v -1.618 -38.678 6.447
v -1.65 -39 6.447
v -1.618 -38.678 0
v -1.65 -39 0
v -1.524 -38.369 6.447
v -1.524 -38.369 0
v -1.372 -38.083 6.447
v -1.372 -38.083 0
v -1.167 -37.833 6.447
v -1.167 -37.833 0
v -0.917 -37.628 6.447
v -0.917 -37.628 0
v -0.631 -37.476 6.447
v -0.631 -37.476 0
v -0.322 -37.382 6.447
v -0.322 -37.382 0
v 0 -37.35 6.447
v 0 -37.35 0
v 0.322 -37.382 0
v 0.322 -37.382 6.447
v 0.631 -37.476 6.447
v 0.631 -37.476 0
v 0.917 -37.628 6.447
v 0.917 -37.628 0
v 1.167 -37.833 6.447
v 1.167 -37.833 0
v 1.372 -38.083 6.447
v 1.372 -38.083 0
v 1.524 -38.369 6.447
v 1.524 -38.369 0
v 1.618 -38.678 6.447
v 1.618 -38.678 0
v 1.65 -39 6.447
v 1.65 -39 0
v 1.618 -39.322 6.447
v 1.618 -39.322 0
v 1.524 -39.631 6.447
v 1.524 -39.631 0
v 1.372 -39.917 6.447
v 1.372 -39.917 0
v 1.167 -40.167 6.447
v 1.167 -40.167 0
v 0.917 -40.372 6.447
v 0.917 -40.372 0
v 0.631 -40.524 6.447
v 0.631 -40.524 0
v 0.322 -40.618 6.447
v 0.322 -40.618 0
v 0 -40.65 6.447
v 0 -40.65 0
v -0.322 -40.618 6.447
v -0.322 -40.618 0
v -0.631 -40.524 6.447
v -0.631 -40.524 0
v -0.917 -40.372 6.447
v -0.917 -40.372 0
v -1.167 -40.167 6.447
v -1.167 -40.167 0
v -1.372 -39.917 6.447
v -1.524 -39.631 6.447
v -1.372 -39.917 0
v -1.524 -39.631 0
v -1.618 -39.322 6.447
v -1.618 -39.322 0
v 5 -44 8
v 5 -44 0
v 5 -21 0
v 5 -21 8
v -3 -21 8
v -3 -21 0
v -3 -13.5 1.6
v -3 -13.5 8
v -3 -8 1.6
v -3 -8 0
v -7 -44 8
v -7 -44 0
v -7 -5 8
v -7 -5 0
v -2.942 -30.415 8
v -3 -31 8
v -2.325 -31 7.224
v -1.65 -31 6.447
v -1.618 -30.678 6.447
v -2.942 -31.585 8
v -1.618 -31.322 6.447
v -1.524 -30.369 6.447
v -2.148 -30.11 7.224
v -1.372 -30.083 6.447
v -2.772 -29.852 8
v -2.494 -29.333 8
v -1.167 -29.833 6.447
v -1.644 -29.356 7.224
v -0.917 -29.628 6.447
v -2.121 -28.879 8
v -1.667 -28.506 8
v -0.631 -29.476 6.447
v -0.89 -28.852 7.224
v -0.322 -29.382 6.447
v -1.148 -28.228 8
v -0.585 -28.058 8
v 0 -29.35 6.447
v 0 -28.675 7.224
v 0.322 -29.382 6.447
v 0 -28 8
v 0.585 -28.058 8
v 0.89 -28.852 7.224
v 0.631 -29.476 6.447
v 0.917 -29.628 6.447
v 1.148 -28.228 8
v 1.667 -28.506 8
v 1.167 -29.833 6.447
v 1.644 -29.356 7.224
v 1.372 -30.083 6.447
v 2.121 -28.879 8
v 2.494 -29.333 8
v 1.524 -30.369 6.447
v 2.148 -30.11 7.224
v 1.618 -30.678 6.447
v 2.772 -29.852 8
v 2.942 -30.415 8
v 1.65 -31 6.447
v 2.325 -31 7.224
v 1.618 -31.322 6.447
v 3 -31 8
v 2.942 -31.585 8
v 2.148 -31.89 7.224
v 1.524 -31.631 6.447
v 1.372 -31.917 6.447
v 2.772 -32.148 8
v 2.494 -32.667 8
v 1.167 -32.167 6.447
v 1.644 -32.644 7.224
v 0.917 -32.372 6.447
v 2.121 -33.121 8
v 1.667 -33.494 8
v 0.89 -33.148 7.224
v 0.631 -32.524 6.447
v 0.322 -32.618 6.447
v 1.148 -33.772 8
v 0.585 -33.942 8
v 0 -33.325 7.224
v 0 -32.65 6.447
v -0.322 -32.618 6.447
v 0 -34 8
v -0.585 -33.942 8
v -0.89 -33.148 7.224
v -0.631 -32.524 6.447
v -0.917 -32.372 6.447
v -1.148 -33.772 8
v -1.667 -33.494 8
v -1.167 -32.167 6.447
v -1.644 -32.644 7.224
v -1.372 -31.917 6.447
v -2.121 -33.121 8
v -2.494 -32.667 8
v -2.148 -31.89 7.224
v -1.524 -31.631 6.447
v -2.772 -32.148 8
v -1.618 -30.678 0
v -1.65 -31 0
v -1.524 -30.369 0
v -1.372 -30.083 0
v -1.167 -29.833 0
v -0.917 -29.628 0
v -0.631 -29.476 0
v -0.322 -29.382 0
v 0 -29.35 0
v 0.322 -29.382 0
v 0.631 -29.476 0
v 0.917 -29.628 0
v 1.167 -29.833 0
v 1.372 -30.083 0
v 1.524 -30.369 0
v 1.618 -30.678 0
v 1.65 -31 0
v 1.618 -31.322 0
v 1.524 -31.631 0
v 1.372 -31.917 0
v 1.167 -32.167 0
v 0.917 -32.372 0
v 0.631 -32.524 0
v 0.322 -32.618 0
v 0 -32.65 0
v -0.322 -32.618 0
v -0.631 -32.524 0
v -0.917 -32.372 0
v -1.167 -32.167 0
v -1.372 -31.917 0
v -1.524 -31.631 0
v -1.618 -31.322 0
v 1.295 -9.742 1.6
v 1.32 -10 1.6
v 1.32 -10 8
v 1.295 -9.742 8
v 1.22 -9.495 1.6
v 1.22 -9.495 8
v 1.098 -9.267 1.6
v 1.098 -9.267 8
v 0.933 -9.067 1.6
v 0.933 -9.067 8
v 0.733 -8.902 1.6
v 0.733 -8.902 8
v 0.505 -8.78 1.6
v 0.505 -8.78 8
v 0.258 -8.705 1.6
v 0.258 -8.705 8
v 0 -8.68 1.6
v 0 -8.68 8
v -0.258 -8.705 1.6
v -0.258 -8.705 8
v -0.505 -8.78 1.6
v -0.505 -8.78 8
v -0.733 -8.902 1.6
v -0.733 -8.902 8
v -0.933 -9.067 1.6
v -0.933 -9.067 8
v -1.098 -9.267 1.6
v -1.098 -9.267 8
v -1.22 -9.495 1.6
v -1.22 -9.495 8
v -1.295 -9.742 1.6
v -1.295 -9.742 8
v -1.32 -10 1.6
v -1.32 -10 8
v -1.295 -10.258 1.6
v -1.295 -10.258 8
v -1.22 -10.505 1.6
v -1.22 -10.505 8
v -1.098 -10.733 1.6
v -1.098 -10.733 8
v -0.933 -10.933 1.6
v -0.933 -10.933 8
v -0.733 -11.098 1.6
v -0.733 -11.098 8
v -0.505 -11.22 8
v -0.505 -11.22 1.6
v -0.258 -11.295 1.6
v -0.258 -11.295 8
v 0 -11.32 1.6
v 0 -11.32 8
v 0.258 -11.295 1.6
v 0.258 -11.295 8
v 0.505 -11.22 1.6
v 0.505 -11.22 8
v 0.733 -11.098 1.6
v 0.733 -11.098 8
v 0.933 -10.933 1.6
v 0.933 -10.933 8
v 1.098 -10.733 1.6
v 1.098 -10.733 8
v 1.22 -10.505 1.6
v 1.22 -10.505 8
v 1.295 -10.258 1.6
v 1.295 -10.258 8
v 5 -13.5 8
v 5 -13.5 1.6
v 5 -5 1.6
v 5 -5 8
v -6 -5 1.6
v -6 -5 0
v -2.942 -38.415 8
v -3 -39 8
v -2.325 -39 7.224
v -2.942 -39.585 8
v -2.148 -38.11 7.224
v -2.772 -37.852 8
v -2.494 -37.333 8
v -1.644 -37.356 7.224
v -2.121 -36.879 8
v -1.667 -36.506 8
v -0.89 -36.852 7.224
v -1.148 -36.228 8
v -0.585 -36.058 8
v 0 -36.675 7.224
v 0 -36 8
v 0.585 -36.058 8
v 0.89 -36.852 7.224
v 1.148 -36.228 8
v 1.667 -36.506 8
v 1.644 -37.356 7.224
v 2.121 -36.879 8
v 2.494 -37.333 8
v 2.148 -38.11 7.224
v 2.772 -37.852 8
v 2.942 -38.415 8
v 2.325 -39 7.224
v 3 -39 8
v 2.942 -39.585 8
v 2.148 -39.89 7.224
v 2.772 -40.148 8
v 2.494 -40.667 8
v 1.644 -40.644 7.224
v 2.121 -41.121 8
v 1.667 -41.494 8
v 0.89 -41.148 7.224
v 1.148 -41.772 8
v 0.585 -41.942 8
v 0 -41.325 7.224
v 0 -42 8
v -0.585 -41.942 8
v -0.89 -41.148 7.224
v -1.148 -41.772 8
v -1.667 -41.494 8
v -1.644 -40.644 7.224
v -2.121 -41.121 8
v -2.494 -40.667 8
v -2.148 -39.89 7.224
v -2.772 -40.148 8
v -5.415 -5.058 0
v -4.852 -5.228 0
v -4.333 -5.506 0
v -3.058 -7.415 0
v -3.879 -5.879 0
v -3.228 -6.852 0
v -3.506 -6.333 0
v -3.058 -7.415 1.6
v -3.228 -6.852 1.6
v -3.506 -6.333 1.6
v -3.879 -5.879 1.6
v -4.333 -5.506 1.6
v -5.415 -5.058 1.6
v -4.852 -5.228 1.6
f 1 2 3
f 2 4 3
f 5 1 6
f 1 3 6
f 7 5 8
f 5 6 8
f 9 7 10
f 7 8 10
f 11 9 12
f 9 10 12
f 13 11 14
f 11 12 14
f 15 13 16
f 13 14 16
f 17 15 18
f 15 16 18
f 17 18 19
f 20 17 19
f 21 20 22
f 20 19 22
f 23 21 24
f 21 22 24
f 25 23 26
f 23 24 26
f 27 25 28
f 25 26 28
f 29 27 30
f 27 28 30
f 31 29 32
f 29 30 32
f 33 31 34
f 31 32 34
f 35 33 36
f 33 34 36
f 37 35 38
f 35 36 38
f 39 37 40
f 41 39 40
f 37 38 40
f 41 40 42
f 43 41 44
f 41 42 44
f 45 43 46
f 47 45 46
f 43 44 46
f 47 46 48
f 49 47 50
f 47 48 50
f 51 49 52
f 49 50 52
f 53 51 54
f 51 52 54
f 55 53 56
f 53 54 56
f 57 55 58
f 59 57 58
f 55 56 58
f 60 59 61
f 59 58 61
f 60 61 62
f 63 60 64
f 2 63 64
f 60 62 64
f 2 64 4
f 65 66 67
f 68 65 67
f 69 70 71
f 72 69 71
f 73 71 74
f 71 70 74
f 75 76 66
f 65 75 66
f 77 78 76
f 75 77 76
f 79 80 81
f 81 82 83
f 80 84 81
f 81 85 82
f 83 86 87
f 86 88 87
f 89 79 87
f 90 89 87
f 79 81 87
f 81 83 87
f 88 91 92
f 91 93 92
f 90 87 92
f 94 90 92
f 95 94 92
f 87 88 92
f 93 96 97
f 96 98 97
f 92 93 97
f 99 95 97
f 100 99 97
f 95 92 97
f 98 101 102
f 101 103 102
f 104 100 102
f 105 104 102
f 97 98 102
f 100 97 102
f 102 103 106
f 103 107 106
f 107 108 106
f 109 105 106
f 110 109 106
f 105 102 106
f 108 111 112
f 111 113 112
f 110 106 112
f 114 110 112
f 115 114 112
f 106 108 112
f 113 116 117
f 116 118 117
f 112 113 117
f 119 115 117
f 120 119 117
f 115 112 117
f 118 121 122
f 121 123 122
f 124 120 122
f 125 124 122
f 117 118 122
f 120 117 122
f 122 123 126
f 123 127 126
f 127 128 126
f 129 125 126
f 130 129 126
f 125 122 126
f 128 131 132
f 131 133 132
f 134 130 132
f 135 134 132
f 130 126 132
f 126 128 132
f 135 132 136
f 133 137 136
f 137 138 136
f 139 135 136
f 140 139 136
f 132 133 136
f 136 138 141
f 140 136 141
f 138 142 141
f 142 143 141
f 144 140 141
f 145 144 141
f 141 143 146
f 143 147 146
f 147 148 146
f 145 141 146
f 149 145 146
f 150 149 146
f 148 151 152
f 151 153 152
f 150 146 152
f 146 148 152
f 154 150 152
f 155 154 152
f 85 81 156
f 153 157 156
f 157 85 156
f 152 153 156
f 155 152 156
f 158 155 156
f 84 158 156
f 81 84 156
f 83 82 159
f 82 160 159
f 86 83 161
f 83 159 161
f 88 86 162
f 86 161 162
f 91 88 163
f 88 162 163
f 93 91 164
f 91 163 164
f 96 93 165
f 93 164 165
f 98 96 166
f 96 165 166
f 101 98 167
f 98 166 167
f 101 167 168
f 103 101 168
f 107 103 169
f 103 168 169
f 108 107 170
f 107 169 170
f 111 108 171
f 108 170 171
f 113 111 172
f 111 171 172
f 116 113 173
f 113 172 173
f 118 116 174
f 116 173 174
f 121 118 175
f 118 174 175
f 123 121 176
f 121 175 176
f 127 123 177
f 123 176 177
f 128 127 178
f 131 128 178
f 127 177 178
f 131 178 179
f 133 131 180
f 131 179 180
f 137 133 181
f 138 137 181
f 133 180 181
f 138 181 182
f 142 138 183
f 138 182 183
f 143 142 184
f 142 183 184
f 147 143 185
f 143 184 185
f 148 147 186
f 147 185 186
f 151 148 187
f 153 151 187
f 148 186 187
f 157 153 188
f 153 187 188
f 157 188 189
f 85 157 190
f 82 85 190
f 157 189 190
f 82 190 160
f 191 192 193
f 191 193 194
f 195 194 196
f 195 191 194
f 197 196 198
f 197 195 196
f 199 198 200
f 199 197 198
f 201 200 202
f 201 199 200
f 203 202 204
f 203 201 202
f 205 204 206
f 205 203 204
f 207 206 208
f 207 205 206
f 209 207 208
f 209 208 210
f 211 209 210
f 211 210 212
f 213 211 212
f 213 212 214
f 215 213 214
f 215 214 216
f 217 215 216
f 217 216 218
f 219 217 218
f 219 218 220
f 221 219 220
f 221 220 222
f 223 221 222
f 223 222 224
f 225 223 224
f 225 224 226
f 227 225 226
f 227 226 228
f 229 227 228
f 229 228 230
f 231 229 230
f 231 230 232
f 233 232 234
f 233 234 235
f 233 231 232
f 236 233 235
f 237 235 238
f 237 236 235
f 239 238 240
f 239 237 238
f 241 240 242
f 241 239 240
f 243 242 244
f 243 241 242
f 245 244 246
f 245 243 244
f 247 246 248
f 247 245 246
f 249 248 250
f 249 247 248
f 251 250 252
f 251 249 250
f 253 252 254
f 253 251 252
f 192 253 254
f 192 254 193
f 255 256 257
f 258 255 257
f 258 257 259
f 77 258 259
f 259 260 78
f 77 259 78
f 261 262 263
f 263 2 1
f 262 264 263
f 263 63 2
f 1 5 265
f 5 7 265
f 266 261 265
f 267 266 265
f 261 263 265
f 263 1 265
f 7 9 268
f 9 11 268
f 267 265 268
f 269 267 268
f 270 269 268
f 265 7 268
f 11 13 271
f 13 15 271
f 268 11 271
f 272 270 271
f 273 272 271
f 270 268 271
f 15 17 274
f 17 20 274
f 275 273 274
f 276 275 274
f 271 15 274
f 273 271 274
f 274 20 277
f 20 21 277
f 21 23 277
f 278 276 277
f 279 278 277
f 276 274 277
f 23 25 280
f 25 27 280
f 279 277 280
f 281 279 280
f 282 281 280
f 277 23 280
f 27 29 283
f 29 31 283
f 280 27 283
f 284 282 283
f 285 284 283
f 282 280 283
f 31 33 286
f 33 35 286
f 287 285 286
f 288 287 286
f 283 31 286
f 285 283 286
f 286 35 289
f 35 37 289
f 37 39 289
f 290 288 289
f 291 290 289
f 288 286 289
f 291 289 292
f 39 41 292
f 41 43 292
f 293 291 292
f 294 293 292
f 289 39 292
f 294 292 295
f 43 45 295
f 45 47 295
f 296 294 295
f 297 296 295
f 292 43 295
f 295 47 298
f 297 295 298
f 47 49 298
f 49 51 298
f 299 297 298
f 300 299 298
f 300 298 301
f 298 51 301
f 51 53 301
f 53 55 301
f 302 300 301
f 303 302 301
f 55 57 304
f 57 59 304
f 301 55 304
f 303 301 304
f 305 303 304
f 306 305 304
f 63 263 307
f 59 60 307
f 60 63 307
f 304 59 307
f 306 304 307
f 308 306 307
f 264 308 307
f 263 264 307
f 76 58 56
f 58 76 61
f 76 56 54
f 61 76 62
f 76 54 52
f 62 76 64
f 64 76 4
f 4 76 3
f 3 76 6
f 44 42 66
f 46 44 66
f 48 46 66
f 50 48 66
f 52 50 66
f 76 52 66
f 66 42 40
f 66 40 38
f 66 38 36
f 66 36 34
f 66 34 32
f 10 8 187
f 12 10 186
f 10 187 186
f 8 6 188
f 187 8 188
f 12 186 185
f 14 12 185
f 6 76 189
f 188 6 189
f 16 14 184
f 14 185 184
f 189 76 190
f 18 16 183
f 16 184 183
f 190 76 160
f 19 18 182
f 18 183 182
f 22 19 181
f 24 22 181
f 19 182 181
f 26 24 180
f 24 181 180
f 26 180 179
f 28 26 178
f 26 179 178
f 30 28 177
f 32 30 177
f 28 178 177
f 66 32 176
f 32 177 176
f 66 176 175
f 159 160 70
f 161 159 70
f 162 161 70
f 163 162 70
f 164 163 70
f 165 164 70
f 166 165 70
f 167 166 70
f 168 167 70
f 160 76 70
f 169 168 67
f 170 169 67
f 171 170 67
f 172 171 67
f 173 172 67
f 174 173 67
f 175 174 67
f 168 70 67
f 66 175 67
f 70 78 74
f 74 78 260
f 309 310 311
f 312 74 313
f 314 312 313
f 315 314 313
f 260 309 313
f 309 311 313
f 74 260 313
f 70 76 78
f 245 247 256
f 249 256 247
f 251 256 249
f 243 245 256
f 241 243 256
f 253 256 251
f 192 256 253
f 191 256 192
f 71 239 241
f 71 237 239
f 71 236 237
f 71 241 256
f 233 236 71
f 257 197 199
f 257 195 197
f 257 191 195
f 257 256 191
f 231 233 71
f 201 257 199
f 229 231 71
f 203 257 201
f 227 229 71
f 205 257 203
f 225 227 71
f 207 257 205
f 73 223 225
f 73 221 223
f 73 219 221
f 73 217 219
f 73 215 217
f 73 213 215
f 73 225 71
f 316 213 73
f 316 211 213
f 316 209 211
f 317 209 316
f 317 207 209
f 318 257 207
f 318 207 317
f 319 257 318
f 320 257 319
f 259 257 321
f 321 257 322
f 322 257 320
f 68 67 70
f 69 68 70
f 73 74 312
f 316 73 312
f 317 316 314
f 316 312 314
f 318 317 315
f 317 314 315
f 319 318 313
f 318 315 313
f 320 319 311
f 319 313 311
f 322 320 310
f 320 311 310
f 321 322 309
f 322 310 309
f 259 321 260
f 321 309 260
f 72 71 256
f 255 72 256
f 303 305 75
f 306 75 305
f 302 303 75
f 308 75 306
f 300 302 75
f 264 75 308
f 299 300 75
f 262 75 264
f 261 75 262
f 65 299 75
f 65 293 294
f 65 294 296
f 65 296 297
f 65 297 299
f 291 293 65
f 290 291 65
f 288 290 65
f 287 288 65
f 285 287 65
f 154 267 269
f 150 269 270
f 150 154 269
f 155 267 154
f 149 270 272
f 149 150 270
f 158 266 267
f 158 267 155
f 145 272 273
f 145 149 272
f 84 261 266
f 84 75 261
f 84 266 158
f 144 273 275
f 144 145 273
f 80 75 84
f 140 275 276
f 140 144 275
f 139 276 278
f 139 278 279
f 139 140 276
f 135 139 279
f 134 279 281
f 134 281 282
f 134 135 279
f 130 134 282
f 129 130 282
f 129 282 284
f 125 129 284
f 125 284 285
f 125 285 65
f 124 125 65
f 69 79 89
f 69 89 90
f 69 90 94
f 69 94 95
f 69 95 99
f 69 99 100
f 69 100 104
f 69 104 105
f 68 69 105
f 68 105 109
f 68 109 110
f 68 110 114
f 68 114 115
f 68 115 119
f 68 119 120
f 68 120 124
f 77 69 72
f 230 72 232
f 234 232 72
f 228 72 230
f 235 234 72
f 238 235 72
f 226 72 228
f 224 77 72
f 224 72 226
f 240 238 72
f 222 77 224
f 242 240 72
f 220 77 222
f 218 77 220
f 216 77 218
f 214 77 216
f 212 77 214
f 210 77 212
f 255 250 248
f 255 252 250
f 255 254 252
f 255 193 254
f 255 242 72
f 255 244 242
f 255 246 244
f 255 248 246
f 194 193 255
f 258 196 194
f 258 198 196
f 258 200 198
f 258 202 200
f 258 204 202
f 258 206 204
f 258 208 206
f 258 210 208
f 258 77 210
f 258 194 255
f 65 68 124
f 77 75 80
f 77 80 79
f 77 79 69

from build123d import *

# Parameters (mm, degrees)
SKETCH099_R         = 1.32
PAD061_DEPTH        = 8
POCKET030_DEPTH     = 1.6
HOLE006_D           = 3.3
HOLE006_CSINK_D     = 6
HOLE006_CSINK_ANGLE = 82


with BuildPart() as part:
    # Sketch099 → Pad061 (new body)
    with BuildSketch(Plane.XY):
        Polygon((-7, -44), (5, -44), (5, -21), (-3, -21), (-3, -13.5), (5, -13.5), (5, -5), (-7, -5), align=None)
        with Locations((0, -10)):
            Circle(SKETCH099_R, mode=Mode.SUBTRACT)
    extrude(amount=PAD061_DEPTH)

    # Sketch100 → Pocket030 (cut)
    with BuildSketch(Plane.XY):
        with BuildLine():
            Line((6, -21), (-3, -21))
            Line((-3, -21), (-3, -8))
            ThreePointArc((-3, -8), (-3.87868, -5.87868), (-6, -5))
            Line((-6, -5), (-6, 4))
            Line((-6, 4), (6, 4))
            Line((6, 4), (6, -21))
        make_face()
    extrude(amount=POCKET030_DEPTH, mode=Mode.SUBTRACT)

    # Hole006 (through all)
    with Locations(Plane.XY.offset(8)):
        with Locations((0, -31), (0, -39)):
            CounterSinkHole(HOLE006_D / 2, HOLE006_CSINK_D / 2, counter_sink_angle=HOLE006_CSINK_ANGLE)


solid = part.part
